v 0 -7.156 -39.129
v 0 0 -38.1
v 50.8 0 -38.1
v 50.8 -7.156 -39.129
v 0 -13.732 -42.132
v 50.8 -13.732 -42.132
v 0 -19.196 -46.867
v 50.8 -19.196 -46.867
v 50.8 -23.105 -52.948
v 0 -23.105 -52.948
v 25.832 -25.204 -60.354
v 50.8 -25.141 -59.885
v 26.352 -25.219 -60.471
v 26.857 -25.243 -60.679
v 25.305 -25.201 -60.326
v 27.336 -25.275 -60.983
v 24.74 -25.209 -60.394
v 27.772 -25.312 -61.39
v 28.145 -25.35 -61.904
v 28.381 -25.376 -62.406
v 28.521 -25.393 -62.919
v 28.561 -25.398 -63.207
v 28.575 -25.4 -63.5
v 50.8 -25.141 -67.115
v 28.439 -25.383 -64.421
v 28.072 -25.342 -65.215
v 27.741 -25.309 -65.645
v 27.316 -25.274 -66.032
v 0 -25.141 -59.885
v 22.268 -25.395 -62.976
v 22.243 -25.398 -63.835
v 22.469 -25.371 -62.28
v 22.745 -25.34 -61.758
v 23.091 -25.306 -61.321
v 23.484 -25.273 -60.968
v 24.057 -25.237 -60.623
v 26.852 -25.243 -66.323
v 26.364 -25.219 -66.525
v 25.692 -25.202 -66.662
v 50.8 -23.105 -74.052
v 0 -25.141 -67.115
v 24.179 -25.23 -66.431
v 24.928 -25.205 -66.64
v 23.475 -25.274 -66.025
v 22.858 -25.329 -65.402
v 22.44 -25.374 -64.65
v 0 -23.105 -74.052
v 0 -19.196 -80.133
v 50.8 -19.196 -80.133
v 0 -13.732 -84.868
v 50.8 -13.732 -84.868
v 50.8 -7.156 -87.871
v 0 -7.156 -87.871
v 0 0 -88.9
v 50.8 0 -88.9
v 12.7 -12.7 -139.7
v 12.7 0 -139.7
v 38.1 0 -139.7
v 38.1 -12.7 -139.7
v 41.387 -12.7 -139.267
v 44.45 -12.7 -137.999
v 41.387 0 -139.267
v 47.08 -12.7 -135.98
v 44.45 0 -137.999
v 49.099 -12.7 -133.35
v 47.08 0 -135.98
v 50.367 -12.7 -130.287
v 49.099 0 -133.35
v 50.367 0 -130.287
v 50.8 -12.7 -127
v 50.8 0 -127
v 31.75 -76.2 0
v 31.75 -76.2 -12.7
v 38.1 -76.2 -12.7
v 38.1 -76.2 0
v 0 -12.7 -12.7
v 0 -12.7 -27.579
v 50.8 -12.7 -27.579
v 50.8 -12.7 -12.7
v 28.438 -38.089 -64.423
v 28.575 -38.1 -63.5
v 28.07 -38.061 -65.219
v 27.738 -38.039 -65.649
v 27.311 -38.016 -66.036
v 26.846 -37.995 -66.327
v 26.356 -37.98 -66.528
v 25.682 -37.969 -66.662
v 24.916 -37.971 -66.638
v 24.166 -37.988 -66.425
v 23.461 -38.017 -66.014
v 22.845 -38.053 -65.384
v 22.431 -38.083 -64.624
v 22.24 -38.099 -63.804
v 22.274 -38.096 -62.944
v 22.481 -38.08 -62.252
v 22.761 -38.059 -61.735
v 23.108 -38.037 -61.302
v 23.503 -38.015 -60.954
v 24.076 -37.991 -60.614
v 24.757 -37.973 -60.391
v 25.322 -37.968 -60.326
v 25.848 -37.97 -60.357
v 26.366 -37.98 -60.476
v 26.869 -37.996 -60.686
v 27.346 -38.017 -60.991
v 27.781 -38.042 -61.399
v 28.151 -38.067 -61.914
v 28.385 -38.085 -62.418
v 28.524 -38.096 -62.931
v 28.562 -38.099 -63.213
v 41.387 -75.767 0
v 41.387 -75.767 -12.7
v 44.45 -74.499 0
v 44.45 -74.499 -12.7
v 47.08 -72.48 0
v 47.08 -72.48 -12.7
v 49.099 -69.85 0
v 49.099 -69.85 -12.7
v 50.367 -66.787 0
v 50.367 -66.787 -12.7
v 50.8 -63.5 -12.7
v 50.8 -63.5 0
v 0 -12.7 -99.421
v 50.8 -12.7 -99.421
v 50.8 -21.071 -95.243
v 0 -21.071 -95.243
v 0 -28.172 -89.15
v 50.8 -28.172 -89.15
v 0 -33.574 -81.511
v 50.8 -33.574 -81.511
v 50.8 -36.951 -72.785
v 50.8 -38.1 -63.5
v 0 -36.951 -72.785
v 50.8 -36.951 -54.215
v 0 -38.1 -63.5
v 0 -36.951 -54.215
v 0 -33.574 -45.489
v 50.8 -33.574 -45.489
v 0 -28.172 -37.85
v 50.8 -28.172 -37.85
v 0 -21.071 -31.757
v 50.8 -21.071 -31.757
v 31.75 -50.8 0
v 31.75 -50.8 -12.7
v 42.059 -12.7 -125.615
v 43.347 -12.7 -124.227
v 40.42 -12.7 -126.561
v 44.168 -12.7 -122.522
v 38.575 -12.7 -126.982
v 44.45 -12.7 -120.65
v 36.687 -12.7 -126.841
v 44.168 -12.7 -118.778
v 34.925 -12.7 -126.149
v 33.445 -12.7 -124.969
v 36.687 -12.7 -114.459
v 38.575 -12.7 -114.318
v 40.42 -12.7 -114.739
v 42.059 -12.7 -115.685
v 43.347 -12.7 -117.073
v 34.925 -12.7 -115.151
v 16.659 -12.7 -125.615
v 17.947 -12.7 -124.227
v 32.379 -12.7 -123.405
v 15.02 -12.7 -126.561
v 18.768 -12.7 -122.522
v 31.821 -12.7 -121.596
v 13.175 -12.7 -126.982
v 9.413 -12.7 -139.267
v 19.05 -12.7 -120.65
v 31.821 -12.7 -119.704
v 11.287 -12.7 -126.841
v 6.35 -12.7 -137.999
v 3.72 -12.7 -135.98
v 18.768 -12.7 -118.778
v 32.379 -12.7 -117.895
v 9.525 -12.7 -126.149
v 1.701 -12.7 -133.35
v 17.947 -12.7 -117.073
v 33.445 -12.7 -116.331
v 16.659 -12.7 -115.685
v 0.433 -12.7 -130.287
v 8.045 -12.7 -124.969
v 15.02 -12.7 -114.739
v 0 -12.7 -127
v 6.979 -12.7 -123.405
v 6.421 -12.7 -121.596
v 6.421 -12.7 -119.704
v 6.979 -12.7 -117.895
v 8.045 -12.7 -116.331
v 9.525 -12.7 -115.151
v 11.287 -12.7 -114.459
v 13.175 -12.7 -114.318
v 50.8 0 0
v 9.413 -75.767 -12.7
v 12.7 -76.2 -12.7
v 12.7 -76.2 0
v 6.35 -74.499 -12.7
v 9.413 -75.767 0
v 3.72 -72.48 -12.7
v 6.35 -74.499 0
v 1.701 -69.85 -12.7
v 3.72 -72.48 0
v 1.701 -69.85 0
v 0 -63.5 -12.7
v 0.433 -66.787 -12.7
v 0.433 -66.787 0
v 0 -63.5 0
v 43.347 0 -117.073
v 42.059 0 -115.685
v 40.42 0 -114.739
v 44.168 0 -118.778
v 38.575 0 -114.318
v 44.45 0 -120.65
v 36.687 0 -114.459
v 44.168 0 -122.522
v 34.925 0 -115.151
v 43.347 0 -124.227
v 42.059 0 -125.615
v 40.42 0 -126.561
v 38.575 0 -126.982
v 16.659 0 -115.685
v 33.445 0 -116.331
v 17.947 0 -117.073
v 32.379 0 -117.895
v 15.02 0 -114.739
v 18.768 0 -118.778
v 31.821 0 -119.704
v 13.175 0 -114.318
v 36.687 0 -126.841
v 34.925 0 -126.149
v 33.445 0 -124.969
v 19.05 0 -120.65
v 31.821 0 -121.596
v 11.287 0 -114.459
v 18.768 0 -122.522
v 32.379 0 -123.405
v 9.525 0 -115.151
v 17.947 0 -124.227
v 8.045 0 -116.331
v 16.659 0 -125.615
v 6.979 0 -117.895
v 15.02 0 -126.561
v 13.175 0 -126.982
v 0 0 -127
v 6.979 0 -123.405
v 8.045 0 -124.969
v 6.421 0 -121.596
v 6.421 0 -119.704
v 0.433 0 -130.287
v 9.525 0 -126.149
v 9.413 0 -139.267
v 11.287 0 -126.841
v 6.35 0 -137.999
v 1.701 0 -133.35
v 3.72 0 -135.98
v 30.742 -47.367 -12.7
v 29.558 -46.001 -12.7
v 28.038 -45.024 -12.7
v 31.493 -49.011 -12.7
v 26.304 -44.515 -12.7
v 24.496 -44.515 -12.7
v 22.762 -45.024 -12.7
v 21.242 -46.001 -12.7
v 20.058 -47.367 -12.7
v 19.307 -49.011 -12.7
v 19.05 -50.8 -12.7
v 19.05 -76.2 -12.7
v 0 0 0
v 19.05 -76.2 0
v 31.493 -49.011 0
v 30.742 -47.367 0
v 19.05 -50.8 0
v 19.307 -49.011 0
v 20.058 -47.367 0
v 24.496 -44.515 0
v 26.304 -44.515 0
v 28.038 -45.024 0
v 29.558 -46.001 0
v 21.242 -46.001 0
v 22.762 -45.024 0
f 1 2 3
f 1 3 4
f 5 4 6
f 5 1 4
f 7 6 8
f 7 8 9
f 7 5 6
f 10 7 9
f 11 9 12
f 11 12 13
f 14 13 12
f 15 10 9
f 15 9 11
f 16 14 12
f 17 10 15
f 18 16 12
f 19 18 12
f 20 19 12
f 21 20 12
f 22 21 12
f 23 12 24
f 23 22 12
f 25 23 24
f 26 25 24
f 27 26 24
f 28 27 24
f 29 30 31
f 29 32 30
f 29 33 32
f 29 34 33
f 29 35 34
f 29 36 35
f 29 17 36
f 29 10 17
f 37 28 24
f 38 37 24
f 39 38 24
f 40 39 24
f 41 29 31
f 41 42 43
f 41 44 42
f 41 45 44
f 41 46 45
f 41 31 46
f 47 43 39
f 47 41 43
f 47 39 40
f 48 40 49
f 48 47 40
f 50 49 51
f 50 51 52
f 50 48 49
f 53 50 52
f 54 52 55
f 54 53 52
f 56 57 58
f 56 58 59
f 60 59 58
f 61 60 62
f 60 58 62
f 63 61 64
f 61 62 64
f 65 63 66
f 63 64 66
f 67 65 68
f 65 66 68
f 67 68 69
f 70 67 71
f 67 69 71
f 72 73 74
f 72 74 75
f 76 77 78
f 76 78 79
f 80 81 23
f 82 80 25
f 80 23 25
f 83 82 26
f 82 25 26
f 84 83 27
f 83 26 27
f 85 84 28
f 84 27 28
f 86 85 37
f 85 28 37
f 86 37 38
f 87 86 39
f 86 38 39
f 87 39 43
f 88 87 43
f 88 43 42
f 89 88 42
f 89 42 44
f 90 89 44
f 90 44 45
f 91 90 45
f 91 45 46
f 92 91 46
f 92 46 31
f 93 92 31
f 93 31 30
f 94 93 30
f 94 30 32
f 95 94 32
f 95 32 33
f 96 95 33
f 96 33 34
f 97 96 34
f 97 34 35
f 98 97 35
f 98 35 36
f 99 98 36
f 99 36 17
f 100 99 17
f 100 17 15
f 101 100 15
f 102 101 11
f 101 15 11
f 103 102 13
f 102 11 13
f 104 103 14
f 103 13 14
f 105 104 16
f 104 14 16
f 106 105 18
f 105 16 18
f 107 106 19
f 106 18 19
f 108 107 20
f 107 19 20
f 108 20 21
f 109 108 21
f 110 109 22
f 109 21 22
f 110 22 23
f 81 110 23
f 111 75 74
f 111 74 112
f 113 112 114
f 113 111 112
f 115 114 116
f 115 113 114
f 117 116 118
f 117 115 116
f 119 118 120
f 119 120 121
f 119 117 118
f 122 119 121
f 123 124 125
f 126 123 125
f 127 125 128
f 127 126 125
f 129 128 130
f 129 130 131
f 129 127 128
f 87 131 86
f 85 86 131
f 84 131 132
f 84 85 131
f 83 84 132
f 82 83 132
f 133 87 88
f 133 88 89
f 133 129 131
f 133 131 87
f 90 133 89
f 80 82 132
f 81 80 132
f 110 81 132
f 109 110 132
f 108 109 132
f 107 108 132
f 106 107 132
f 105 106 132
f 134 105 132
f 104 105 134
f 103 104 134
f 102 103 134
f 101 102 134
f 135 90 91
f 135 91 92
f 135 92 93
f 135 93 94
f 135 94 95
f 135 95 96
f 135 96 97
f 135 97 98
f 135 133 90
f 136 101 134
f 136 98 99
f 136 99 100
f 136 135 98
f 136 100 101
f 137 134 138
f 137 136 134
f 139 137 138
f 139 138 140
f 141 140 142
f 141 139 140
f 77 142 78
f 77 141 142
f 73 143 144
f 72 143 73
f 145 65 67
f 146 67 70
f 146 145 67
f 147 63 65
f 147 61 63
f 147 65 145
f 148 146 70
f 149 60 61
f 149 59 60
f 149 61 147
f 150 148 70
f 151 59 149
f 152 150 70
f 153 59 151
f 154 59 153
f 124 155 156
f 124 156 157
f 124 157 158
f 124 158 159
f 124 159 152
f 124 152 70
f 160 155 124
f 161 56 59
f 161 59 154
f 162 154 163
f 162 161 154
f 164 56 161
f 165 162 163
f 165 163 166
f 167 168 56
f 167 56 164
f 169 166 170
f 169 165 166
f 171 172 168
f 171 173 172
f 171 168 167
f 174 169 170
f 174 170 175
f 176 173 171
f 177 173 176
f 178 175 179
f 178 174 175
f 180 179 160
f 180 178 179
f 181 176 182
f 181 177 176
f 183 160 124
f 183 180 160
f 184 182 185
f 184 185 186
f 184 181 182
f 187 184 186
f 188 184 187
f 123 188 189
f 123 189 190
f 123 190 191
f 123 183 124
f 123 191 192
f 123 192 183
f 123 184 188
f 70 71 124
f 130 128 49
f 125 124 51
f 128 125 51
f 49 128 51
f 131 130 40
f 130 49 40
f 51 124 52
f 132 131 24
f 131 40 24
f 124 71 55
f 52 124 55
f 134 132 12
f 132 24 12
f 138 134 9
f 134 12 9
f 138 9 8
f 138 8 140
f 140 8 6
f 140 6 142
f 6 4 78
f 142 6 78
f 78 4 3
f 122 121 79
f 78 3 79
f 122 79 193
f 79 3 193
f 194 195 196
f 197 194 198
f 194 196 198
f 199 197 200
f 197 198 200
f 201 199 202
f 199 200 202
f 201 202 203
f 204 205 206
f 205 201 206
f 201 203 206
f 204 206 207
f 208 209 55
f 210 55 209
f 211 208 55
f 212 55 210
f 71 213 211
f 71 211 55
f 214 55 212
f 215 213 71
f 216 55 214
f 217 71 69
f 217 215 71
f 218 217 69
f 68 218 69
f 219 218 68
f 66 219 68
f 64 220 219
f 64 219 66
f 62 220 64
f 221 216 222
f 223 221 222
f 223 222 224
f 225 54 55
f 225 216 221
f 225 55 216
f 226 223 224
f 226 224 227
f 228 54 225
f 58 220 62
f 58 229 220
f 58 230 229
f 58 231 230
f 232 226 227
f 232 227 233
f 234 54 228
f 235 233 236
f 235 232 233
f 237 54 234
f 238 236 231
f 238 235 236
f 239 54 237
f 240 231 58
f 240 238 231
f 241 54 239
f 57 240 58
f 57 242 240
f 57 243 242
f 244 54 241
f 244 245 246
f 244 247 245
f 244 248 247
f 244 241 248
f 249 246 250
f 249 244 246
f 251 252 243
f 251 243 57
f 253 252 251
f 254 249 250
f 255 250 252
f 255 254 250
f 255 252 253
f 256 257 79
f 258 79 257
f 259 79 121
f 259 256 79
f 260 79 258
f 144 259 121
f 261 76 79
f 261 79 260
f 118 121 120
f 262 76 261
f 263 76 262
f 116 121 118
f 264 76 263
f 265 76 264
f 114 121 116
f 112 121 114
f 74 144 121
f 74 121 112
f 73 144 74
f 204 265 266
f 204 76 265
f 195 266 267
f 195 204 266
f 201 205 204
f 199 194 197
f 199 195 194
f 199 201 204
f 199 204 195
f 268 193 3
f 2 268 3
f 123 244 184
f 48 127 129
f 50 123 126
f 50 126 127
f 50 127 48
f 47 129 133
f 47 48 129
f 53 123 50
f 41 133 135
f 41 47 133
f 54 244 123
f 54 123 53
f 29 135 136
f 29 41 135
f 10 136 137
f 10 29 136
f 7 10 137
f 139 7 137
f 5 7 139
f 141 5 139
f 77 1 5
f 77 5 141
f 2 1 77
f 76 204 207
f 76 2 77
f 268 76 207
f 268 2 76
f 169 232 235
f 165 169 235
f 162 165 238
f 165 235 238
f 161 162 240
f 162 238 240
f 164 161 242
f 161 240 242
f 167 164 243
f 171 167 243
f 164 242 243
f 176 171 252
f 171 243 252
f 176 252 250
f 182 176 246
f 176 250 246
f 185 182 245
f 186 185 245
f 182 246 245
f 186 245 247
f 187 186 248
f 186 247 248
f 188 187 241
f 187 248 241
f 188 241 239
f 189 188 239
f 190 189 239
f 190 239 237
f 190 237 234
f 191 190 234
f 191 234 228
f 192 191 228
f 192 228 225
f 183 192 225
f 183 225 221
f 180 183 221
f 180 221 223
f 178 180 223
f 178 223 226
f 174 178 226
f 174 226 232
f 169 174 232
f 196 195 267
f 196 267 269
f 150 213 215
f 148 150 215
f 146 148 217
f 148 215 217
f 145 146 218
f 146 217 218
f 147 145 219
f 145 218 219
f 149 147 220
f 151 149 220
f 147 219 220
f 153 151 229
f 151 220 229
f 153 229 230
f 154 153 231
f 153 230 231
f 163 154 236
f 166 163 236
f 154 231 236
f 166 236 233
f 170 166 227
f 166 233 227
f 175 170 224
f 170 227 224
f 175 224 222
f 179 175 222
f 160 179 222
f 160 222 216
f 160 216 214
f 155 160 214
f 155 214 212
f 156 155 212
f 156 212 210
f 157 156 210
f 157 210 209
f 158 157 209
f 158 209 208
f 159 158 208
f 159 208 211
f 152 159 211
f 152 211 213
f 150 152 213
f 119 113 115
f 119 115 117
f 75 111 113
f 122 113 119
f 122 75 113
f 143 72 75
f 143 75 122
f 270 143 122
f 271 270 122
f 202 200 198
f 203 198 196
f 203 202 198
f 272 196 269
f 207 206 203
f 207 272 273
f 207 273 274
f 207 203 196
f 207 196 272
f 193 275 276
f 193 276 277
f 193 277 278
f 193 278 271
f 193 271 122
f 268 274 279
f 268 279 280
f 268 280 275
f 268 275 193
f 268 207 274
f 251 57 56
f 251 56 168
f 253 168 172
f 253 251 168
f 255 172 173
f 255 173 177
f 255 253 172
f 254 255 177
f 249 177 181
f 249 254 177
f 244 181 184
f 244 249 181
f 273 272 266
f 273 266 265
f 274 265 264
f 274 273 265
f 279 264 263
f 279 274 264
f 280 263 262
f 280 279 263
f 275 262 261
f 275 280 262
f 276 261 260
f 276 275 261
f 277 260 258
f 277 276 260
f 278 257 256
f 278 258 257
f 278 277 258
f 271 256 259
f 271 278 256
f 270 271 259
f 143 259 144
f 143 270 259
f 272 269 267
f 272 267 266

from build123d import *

# Parameters (mm, degrees)
BOSS_EXTRUDE1_DEPTH = 50.8
CUT_EXTRUDE1_DEPTH  = 22.86
CUT_EXTRUDE2_DEPTH  = 22.86
CUT_EXTRUDE3_DEPTH  = 22.86
SKETCH6_R           = 3.175
CUT_EXTRUDE4_DEPTH  = 60.96
CUT_EXTRUDE5_DEPTH  = 30.48
CUT_EXTRUDE6_DEPTH  = 30.48
SKETCH10_R          = 6.35
CUT_EXTRUDE7_DEPTH  = 30.48


with BuildPart() as part:
    # Sketch2 → Boss-Extrude1 (new body)
    with BuildSketch(Plane(origin=(0, 0, 0), x_dir=(0, 0, -1), z_dir=(1, 0, 0))):
        with BuildLine():
            Line((0, 0), (38.1, 0))
            ThreePointArc((38.1, 0), (63.5, -25.4), (88.9, 0))
            Line((88.9, 0), (139.7, 0))
            Line((139.7, 0), (139.7, -12.7))
            Line((139.7, -12.7), (99.421024484, -12.7))
            ThreePointArc((99.421024484, -12.7), (63.5, -38.1), (27.578975516, -12.7))
            Line((27.578975516, -12.7), (12.7, -12.7))
            Line((12.7, -12.7), (12.7, -76.2))
            Line((12.7, -76.2), (0, -76.2))
            Line((0, -76.2), (0, 0))
        make_face()
    extrude(amount=BOSS_EXTRUDE1_DEPTH)

    # Sketch3 → Cut-Extrude1 (cut)
    with BuildSketch(Plane.XY):
        with BuildLine():
            Line((50.8, -63.5), (50.8, -76.2))
            Line((50.8, -76.2), (38.1, -76.2))
            ThreePointArc((38.1, -76.2), (47.080256121, -72.480256121), (50.8, -63.5))
        make_face()
    extrude(amount=-CUT_EXTRUDE1_DEPTH, mode=Mode.SUBTRACT)

    # Sketch4 → Cut-Extrude2 (cut)
    with BuildSketch(Plane.XY):
        with BuildLine():
            Line((0, -63.5), (0, -76.2))
            Line((0, -76.2), (12.7, -76.2))
            ThreePointArc((12.7, -76.2), (3.719743879, -72.480256121), (0, -63.5))
        make_face()
    extrude(amount=-CUT_EXTRUDE2_DEPTH, mode=Mode.SUBTRACT)

    # Sketch5 → Cut-Extrude3 (cut)
    with BuildSketch(Plane.XY):
        with BuildLine():
            Line((19.05, -76.2), (19.05, -50.8))
            ThreePointArc((19.05, -50.8), (25.4, -44.45), (31.75, -50.8))
            Line((31.75, -50.8), (31.75, -76.2))
            Line((31.75, -76.2), (19.05, -76.2))
        make_face()
    extrude(amount=-CUT_EXTRUDE3_DEPTH, mode=Mode.SUBTRACT)

    # Sketch6 → Cut-Extrude4 (cut)
    with BuildSketch(Plane(origin=(0, 0, 0), x_dir=(1, 0, 0), z_dir=(0, 1, 0))):
        with Locations((25.4, 63.5)):
            Circle(SKETCH6_R)
    extrude(amount=-CUT_EXTRUDE4_DEPTH, mode=Mode.SUBTRACT)

    # Sketch7 → Cut-Extrude5 (cut)
    with BuildSketch(Plane(origin=(0, 0, 0), x_dir=(1, 0, 0), z_dir=(0, 1, 0))):
        with BuildLine():
            Line((0, 127), (0, 139.7))
            Line((0, 139.7), (12.7, 139.7))
            ThreePointArc((12.7, 139.7), (3.719743879, 135.980256121), (0, 127))
        make_face()
    extrude(amount=-CUT_EXTRUDE5_DEPTH, mode=Mode.SUBTRACT)

    # Sketch9 → Cut-Extrude6 (cut)
    with BuildSketch(Plane(origin=(0, 0, 0), x_dir=(1, 0, 0), z_dir=(0, 1, 0))):
        with BuildLine():
            Line((50.8, 127), (50.8, 139.7))
            Line((50.8, 139.7), (38.1, 139.7))
            ThreePointArc((38.1, 139.7), (47.080256121, 135.980256121), (50.8, 127))
        make_face()
    extrude(amount=-CUT_EXTRUDE6_DEPTH, mode=Mode.SUBTRACT)

    # Sketch10 → Cut-Extrude7 (cut)
    with BuildSketch(Plane(origin=(0, 0, 0), x_dir=(1, 0, 0), z_dir=(0, 1, 0))):
        with Locations((38.1, 120.65)):
            Circle(SKETCH10_R)
        with Locations((12.7, 120.65)):
            Circle(SKETCH10_R)
    extrude(amount=-CUT_EXTRUDE7_DEPTH, mode=Mode.SUBTRACT)


solid = part.part
